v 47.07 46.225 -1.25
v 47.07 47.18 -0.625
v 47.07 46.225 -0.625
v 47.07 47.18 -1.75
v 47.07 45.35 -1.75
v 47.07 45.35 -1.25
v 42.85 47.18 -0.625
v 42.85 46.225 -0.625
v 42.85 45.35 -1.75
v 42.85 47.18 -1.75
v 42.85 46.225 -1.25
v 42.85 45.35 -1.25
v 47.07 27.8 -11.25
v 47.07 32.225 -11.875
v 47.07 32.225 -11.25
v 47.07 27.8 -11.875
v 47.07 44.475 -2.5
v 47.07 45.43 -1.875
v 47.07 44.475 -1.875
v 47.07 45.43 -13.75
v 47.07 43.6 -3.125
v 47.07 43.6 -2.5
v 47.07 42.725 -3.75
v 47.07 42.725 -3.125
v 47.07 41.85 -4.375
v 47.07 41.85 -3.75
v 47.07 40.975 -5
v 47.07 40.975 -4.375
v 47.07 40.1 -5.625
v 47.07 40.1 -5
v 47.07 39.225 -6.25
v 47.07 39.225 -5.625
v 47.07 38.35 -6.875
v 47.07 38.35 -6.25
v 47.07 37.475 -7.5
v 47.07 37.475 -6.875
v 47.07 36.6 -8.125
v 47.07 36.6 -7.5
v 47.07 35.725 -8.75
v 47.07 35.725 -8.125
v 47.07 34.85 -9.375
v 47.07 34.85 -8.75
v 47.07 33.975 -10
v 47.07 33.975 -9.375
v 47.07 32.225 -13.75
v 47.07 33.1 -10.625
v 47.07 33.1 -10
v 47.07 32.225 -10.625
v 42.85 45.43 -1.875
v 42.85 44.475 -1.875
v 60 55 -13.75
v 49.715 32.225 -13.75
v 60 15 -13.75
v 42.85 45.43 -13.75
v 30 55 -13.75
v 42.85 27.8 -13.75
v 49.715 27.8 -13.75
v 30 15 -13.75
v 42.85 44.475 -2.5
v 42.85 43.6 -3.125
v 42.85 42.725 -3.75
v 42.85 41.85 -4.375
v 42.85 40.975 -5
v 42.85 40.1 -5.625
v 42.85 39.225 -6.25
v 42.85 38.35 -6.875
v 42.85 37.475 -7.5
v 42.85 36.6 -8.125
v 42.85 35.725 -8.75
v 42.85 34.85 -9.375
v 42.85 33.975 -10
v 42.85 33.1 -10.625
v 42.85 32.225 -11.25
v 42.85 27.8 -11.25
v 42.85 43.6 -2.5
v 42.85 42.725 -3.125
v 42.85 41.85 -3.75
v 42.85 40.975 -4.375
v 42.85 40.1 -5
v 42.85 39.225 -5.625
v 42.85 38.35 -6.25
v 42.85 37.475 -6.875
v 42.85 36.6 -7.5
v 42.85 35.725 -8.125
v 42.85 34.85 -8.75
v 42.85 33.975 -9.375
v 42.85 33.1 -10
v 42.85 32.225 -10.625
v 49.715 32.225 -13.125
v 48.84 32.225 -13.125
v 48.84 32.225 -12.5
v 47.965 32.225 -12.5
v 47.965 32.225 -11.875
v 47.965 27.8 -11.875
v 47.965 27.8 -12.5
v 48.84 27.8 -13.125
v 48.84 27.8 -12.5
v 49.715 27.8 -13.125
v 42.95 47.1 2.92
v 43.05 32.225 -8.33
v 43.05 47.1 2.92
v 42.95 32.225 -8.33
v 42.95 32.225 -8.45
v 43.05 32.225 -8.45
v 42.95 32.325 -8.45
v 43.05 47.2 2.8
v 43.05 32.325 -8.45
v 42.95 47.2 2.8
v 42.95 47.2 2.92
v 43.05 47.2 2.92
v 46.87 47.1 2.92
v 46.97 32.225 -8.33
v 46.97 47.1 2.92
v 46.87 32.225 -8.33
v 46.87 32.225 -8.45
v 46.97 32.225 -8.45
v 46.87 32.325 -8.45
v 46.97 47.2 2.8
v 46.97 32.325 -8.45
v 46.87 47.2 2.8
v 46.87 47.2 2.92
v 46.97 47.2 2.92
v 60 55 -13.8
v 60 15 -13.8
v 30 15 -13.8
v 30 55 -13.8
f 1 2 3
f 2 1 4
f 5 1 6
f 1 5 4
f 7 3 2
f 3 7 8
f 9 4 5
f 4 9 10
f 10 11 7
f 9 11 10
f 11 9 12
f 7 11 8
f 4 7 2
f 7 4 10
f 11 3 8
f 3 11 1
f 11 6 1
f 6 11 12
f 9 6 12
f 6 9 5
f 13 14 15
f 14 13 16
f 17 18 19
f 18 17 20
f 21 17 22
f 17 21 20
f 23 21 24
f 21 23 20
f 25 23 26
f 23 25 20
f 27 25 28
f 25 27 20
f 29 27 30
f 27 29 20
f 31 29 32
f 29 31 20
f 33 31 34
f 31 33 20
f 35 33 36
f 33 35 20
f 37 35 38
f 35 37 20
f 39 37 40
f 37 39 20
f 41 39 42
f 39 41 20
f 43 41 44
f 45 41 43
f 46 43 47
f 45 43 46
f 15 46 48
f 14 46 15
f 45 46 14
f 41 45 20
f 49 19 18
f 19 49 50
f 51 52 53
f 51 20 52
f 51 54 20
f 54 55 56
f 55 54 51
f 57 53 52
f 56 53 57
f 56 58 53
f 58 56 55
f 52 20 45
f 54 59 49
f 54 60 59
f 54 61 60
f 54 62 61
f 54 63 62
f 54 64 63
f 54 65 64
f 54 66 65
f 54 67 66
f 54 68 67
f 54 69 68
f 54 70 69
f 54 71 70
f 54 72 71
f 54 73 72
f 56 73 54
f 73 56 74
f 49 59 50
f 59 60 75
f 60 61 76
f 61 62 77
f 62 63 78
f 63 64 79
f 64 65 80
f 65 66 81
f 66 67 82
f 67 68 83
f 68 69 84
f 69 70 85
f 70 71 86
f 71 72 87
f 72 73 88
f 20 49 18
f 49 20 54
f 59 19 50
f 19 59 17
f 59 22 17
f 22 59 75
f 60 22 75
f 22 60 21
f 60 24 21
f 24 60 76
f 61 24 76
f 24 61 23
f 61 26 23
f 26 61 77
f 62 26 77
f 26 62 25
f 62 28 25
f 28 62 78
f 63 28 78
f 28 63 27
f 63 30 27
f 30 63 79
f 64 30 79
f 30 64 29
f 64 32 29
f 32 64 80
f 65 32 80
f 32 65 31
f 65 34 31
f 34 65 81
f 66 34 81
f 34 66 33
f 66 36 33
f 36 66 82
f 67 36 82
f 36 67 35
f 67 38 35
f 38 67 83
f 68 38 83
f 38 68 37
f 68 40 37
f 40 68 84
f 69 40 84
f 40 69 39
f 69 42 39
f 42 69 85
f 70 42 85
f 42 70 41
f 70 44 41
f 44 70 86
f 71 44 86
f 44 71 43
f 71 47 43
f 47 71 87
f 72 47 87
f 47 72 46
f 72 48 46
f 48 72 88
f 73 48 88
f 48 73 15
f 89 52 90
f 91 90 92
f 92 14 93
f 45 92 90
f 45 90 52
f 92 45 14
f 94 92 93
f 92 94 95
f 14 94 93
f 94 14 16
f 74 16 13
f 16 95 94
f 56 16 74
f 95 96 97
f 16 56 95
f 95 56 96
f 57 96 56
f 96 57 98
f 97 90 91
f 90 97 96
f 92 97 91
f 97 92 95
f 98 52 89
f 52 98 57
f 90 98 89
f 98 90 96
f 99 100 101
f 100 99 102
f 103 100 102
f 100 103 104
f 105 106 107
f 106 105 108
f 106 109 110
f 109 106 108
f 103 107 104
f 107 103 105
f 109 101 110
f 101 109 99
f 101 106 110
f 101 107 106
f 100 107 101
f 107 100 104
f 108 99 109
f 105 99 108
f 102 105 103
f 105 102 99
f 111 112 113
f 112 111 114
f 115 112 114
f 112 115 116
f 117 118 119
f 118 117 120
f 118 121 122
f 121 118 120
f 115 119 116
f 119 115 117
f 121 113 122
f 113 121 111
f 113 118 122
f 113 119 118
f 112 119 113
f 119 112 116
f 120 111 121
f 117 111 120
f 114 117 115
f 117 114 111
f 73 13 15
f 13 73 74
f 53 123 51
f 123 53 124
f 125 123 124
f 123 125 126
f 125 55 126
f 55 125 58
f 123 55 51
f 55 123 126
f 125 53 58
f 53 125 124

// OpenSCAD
// Option A stair only (both flights, landing), for the section render.
use <../../../models/house_lib.scad>
function sa_rise() = floor_to_floor() / 22;
function sa_run()  = 10.5 / 12;
function sa_n1()   = 18;
function sa_land_y() = [27.8, stair_top_y() - (sa_n1() - 1) * sa_run()];   // 27.8 .. 32.225
module main_stair_a(z_main = 0, y_box = 45.34) {
    x0 = stair_x()[0] + wall_t() / 2;
    x1 = stair_x()[1] - wall_t() / 2;
    zb = z_main - floor_to_floor();
    paint(stair_color())
        for (i = [1 : sa_n1() - 1]) {
            ya = stair_top_y() - i * sa_run();
            z = z_main - i * sa_rise();
            zf = ya + sa_run() / 2 > y_box ? z_main - main_floor_depth() - 0.125 : zb;
            translate([x0, ya, zf]) cube([x1 - x0, sa_run() + 0.08, z - zf]);
        }
    zl = z_main - sa_n1() * sa_rise();
    paint(stair_color()) translate([x0, sa_land_y()[0], zb]) cube([x1 - x0, sa_land_y()[1] - sa_land_y()[0], zl - zb]);
    paint(stair_color())
        for (j = [1 : 3])
            translate([x1 + (j - 1) * sa_run(), sa_land_y()[0], zb])
                cube([sa_run() + 0.02, sa_land_y()[1] - sa_land_y()[0], zl - j * sa_rise() - zb]);
    paint([0.40, 0.28, 0.18])
        for (x = [x0 + 0.1, x1 - 0.2])
            hull() {
                translate([x, stair_top_y(), z_main + 2.8]) cube([0.1, 0.1, 0.12]);
                translate([x, sa_land_y()[1], zl + 2.8]) cube([0.1, 0.1, 0.12]);
            }
}


// basement slab
color([0.6,0.6,0.6,0.5]) translate([30,15,-13.8]) cube([30,40,0.05]);
main_stair_a();
